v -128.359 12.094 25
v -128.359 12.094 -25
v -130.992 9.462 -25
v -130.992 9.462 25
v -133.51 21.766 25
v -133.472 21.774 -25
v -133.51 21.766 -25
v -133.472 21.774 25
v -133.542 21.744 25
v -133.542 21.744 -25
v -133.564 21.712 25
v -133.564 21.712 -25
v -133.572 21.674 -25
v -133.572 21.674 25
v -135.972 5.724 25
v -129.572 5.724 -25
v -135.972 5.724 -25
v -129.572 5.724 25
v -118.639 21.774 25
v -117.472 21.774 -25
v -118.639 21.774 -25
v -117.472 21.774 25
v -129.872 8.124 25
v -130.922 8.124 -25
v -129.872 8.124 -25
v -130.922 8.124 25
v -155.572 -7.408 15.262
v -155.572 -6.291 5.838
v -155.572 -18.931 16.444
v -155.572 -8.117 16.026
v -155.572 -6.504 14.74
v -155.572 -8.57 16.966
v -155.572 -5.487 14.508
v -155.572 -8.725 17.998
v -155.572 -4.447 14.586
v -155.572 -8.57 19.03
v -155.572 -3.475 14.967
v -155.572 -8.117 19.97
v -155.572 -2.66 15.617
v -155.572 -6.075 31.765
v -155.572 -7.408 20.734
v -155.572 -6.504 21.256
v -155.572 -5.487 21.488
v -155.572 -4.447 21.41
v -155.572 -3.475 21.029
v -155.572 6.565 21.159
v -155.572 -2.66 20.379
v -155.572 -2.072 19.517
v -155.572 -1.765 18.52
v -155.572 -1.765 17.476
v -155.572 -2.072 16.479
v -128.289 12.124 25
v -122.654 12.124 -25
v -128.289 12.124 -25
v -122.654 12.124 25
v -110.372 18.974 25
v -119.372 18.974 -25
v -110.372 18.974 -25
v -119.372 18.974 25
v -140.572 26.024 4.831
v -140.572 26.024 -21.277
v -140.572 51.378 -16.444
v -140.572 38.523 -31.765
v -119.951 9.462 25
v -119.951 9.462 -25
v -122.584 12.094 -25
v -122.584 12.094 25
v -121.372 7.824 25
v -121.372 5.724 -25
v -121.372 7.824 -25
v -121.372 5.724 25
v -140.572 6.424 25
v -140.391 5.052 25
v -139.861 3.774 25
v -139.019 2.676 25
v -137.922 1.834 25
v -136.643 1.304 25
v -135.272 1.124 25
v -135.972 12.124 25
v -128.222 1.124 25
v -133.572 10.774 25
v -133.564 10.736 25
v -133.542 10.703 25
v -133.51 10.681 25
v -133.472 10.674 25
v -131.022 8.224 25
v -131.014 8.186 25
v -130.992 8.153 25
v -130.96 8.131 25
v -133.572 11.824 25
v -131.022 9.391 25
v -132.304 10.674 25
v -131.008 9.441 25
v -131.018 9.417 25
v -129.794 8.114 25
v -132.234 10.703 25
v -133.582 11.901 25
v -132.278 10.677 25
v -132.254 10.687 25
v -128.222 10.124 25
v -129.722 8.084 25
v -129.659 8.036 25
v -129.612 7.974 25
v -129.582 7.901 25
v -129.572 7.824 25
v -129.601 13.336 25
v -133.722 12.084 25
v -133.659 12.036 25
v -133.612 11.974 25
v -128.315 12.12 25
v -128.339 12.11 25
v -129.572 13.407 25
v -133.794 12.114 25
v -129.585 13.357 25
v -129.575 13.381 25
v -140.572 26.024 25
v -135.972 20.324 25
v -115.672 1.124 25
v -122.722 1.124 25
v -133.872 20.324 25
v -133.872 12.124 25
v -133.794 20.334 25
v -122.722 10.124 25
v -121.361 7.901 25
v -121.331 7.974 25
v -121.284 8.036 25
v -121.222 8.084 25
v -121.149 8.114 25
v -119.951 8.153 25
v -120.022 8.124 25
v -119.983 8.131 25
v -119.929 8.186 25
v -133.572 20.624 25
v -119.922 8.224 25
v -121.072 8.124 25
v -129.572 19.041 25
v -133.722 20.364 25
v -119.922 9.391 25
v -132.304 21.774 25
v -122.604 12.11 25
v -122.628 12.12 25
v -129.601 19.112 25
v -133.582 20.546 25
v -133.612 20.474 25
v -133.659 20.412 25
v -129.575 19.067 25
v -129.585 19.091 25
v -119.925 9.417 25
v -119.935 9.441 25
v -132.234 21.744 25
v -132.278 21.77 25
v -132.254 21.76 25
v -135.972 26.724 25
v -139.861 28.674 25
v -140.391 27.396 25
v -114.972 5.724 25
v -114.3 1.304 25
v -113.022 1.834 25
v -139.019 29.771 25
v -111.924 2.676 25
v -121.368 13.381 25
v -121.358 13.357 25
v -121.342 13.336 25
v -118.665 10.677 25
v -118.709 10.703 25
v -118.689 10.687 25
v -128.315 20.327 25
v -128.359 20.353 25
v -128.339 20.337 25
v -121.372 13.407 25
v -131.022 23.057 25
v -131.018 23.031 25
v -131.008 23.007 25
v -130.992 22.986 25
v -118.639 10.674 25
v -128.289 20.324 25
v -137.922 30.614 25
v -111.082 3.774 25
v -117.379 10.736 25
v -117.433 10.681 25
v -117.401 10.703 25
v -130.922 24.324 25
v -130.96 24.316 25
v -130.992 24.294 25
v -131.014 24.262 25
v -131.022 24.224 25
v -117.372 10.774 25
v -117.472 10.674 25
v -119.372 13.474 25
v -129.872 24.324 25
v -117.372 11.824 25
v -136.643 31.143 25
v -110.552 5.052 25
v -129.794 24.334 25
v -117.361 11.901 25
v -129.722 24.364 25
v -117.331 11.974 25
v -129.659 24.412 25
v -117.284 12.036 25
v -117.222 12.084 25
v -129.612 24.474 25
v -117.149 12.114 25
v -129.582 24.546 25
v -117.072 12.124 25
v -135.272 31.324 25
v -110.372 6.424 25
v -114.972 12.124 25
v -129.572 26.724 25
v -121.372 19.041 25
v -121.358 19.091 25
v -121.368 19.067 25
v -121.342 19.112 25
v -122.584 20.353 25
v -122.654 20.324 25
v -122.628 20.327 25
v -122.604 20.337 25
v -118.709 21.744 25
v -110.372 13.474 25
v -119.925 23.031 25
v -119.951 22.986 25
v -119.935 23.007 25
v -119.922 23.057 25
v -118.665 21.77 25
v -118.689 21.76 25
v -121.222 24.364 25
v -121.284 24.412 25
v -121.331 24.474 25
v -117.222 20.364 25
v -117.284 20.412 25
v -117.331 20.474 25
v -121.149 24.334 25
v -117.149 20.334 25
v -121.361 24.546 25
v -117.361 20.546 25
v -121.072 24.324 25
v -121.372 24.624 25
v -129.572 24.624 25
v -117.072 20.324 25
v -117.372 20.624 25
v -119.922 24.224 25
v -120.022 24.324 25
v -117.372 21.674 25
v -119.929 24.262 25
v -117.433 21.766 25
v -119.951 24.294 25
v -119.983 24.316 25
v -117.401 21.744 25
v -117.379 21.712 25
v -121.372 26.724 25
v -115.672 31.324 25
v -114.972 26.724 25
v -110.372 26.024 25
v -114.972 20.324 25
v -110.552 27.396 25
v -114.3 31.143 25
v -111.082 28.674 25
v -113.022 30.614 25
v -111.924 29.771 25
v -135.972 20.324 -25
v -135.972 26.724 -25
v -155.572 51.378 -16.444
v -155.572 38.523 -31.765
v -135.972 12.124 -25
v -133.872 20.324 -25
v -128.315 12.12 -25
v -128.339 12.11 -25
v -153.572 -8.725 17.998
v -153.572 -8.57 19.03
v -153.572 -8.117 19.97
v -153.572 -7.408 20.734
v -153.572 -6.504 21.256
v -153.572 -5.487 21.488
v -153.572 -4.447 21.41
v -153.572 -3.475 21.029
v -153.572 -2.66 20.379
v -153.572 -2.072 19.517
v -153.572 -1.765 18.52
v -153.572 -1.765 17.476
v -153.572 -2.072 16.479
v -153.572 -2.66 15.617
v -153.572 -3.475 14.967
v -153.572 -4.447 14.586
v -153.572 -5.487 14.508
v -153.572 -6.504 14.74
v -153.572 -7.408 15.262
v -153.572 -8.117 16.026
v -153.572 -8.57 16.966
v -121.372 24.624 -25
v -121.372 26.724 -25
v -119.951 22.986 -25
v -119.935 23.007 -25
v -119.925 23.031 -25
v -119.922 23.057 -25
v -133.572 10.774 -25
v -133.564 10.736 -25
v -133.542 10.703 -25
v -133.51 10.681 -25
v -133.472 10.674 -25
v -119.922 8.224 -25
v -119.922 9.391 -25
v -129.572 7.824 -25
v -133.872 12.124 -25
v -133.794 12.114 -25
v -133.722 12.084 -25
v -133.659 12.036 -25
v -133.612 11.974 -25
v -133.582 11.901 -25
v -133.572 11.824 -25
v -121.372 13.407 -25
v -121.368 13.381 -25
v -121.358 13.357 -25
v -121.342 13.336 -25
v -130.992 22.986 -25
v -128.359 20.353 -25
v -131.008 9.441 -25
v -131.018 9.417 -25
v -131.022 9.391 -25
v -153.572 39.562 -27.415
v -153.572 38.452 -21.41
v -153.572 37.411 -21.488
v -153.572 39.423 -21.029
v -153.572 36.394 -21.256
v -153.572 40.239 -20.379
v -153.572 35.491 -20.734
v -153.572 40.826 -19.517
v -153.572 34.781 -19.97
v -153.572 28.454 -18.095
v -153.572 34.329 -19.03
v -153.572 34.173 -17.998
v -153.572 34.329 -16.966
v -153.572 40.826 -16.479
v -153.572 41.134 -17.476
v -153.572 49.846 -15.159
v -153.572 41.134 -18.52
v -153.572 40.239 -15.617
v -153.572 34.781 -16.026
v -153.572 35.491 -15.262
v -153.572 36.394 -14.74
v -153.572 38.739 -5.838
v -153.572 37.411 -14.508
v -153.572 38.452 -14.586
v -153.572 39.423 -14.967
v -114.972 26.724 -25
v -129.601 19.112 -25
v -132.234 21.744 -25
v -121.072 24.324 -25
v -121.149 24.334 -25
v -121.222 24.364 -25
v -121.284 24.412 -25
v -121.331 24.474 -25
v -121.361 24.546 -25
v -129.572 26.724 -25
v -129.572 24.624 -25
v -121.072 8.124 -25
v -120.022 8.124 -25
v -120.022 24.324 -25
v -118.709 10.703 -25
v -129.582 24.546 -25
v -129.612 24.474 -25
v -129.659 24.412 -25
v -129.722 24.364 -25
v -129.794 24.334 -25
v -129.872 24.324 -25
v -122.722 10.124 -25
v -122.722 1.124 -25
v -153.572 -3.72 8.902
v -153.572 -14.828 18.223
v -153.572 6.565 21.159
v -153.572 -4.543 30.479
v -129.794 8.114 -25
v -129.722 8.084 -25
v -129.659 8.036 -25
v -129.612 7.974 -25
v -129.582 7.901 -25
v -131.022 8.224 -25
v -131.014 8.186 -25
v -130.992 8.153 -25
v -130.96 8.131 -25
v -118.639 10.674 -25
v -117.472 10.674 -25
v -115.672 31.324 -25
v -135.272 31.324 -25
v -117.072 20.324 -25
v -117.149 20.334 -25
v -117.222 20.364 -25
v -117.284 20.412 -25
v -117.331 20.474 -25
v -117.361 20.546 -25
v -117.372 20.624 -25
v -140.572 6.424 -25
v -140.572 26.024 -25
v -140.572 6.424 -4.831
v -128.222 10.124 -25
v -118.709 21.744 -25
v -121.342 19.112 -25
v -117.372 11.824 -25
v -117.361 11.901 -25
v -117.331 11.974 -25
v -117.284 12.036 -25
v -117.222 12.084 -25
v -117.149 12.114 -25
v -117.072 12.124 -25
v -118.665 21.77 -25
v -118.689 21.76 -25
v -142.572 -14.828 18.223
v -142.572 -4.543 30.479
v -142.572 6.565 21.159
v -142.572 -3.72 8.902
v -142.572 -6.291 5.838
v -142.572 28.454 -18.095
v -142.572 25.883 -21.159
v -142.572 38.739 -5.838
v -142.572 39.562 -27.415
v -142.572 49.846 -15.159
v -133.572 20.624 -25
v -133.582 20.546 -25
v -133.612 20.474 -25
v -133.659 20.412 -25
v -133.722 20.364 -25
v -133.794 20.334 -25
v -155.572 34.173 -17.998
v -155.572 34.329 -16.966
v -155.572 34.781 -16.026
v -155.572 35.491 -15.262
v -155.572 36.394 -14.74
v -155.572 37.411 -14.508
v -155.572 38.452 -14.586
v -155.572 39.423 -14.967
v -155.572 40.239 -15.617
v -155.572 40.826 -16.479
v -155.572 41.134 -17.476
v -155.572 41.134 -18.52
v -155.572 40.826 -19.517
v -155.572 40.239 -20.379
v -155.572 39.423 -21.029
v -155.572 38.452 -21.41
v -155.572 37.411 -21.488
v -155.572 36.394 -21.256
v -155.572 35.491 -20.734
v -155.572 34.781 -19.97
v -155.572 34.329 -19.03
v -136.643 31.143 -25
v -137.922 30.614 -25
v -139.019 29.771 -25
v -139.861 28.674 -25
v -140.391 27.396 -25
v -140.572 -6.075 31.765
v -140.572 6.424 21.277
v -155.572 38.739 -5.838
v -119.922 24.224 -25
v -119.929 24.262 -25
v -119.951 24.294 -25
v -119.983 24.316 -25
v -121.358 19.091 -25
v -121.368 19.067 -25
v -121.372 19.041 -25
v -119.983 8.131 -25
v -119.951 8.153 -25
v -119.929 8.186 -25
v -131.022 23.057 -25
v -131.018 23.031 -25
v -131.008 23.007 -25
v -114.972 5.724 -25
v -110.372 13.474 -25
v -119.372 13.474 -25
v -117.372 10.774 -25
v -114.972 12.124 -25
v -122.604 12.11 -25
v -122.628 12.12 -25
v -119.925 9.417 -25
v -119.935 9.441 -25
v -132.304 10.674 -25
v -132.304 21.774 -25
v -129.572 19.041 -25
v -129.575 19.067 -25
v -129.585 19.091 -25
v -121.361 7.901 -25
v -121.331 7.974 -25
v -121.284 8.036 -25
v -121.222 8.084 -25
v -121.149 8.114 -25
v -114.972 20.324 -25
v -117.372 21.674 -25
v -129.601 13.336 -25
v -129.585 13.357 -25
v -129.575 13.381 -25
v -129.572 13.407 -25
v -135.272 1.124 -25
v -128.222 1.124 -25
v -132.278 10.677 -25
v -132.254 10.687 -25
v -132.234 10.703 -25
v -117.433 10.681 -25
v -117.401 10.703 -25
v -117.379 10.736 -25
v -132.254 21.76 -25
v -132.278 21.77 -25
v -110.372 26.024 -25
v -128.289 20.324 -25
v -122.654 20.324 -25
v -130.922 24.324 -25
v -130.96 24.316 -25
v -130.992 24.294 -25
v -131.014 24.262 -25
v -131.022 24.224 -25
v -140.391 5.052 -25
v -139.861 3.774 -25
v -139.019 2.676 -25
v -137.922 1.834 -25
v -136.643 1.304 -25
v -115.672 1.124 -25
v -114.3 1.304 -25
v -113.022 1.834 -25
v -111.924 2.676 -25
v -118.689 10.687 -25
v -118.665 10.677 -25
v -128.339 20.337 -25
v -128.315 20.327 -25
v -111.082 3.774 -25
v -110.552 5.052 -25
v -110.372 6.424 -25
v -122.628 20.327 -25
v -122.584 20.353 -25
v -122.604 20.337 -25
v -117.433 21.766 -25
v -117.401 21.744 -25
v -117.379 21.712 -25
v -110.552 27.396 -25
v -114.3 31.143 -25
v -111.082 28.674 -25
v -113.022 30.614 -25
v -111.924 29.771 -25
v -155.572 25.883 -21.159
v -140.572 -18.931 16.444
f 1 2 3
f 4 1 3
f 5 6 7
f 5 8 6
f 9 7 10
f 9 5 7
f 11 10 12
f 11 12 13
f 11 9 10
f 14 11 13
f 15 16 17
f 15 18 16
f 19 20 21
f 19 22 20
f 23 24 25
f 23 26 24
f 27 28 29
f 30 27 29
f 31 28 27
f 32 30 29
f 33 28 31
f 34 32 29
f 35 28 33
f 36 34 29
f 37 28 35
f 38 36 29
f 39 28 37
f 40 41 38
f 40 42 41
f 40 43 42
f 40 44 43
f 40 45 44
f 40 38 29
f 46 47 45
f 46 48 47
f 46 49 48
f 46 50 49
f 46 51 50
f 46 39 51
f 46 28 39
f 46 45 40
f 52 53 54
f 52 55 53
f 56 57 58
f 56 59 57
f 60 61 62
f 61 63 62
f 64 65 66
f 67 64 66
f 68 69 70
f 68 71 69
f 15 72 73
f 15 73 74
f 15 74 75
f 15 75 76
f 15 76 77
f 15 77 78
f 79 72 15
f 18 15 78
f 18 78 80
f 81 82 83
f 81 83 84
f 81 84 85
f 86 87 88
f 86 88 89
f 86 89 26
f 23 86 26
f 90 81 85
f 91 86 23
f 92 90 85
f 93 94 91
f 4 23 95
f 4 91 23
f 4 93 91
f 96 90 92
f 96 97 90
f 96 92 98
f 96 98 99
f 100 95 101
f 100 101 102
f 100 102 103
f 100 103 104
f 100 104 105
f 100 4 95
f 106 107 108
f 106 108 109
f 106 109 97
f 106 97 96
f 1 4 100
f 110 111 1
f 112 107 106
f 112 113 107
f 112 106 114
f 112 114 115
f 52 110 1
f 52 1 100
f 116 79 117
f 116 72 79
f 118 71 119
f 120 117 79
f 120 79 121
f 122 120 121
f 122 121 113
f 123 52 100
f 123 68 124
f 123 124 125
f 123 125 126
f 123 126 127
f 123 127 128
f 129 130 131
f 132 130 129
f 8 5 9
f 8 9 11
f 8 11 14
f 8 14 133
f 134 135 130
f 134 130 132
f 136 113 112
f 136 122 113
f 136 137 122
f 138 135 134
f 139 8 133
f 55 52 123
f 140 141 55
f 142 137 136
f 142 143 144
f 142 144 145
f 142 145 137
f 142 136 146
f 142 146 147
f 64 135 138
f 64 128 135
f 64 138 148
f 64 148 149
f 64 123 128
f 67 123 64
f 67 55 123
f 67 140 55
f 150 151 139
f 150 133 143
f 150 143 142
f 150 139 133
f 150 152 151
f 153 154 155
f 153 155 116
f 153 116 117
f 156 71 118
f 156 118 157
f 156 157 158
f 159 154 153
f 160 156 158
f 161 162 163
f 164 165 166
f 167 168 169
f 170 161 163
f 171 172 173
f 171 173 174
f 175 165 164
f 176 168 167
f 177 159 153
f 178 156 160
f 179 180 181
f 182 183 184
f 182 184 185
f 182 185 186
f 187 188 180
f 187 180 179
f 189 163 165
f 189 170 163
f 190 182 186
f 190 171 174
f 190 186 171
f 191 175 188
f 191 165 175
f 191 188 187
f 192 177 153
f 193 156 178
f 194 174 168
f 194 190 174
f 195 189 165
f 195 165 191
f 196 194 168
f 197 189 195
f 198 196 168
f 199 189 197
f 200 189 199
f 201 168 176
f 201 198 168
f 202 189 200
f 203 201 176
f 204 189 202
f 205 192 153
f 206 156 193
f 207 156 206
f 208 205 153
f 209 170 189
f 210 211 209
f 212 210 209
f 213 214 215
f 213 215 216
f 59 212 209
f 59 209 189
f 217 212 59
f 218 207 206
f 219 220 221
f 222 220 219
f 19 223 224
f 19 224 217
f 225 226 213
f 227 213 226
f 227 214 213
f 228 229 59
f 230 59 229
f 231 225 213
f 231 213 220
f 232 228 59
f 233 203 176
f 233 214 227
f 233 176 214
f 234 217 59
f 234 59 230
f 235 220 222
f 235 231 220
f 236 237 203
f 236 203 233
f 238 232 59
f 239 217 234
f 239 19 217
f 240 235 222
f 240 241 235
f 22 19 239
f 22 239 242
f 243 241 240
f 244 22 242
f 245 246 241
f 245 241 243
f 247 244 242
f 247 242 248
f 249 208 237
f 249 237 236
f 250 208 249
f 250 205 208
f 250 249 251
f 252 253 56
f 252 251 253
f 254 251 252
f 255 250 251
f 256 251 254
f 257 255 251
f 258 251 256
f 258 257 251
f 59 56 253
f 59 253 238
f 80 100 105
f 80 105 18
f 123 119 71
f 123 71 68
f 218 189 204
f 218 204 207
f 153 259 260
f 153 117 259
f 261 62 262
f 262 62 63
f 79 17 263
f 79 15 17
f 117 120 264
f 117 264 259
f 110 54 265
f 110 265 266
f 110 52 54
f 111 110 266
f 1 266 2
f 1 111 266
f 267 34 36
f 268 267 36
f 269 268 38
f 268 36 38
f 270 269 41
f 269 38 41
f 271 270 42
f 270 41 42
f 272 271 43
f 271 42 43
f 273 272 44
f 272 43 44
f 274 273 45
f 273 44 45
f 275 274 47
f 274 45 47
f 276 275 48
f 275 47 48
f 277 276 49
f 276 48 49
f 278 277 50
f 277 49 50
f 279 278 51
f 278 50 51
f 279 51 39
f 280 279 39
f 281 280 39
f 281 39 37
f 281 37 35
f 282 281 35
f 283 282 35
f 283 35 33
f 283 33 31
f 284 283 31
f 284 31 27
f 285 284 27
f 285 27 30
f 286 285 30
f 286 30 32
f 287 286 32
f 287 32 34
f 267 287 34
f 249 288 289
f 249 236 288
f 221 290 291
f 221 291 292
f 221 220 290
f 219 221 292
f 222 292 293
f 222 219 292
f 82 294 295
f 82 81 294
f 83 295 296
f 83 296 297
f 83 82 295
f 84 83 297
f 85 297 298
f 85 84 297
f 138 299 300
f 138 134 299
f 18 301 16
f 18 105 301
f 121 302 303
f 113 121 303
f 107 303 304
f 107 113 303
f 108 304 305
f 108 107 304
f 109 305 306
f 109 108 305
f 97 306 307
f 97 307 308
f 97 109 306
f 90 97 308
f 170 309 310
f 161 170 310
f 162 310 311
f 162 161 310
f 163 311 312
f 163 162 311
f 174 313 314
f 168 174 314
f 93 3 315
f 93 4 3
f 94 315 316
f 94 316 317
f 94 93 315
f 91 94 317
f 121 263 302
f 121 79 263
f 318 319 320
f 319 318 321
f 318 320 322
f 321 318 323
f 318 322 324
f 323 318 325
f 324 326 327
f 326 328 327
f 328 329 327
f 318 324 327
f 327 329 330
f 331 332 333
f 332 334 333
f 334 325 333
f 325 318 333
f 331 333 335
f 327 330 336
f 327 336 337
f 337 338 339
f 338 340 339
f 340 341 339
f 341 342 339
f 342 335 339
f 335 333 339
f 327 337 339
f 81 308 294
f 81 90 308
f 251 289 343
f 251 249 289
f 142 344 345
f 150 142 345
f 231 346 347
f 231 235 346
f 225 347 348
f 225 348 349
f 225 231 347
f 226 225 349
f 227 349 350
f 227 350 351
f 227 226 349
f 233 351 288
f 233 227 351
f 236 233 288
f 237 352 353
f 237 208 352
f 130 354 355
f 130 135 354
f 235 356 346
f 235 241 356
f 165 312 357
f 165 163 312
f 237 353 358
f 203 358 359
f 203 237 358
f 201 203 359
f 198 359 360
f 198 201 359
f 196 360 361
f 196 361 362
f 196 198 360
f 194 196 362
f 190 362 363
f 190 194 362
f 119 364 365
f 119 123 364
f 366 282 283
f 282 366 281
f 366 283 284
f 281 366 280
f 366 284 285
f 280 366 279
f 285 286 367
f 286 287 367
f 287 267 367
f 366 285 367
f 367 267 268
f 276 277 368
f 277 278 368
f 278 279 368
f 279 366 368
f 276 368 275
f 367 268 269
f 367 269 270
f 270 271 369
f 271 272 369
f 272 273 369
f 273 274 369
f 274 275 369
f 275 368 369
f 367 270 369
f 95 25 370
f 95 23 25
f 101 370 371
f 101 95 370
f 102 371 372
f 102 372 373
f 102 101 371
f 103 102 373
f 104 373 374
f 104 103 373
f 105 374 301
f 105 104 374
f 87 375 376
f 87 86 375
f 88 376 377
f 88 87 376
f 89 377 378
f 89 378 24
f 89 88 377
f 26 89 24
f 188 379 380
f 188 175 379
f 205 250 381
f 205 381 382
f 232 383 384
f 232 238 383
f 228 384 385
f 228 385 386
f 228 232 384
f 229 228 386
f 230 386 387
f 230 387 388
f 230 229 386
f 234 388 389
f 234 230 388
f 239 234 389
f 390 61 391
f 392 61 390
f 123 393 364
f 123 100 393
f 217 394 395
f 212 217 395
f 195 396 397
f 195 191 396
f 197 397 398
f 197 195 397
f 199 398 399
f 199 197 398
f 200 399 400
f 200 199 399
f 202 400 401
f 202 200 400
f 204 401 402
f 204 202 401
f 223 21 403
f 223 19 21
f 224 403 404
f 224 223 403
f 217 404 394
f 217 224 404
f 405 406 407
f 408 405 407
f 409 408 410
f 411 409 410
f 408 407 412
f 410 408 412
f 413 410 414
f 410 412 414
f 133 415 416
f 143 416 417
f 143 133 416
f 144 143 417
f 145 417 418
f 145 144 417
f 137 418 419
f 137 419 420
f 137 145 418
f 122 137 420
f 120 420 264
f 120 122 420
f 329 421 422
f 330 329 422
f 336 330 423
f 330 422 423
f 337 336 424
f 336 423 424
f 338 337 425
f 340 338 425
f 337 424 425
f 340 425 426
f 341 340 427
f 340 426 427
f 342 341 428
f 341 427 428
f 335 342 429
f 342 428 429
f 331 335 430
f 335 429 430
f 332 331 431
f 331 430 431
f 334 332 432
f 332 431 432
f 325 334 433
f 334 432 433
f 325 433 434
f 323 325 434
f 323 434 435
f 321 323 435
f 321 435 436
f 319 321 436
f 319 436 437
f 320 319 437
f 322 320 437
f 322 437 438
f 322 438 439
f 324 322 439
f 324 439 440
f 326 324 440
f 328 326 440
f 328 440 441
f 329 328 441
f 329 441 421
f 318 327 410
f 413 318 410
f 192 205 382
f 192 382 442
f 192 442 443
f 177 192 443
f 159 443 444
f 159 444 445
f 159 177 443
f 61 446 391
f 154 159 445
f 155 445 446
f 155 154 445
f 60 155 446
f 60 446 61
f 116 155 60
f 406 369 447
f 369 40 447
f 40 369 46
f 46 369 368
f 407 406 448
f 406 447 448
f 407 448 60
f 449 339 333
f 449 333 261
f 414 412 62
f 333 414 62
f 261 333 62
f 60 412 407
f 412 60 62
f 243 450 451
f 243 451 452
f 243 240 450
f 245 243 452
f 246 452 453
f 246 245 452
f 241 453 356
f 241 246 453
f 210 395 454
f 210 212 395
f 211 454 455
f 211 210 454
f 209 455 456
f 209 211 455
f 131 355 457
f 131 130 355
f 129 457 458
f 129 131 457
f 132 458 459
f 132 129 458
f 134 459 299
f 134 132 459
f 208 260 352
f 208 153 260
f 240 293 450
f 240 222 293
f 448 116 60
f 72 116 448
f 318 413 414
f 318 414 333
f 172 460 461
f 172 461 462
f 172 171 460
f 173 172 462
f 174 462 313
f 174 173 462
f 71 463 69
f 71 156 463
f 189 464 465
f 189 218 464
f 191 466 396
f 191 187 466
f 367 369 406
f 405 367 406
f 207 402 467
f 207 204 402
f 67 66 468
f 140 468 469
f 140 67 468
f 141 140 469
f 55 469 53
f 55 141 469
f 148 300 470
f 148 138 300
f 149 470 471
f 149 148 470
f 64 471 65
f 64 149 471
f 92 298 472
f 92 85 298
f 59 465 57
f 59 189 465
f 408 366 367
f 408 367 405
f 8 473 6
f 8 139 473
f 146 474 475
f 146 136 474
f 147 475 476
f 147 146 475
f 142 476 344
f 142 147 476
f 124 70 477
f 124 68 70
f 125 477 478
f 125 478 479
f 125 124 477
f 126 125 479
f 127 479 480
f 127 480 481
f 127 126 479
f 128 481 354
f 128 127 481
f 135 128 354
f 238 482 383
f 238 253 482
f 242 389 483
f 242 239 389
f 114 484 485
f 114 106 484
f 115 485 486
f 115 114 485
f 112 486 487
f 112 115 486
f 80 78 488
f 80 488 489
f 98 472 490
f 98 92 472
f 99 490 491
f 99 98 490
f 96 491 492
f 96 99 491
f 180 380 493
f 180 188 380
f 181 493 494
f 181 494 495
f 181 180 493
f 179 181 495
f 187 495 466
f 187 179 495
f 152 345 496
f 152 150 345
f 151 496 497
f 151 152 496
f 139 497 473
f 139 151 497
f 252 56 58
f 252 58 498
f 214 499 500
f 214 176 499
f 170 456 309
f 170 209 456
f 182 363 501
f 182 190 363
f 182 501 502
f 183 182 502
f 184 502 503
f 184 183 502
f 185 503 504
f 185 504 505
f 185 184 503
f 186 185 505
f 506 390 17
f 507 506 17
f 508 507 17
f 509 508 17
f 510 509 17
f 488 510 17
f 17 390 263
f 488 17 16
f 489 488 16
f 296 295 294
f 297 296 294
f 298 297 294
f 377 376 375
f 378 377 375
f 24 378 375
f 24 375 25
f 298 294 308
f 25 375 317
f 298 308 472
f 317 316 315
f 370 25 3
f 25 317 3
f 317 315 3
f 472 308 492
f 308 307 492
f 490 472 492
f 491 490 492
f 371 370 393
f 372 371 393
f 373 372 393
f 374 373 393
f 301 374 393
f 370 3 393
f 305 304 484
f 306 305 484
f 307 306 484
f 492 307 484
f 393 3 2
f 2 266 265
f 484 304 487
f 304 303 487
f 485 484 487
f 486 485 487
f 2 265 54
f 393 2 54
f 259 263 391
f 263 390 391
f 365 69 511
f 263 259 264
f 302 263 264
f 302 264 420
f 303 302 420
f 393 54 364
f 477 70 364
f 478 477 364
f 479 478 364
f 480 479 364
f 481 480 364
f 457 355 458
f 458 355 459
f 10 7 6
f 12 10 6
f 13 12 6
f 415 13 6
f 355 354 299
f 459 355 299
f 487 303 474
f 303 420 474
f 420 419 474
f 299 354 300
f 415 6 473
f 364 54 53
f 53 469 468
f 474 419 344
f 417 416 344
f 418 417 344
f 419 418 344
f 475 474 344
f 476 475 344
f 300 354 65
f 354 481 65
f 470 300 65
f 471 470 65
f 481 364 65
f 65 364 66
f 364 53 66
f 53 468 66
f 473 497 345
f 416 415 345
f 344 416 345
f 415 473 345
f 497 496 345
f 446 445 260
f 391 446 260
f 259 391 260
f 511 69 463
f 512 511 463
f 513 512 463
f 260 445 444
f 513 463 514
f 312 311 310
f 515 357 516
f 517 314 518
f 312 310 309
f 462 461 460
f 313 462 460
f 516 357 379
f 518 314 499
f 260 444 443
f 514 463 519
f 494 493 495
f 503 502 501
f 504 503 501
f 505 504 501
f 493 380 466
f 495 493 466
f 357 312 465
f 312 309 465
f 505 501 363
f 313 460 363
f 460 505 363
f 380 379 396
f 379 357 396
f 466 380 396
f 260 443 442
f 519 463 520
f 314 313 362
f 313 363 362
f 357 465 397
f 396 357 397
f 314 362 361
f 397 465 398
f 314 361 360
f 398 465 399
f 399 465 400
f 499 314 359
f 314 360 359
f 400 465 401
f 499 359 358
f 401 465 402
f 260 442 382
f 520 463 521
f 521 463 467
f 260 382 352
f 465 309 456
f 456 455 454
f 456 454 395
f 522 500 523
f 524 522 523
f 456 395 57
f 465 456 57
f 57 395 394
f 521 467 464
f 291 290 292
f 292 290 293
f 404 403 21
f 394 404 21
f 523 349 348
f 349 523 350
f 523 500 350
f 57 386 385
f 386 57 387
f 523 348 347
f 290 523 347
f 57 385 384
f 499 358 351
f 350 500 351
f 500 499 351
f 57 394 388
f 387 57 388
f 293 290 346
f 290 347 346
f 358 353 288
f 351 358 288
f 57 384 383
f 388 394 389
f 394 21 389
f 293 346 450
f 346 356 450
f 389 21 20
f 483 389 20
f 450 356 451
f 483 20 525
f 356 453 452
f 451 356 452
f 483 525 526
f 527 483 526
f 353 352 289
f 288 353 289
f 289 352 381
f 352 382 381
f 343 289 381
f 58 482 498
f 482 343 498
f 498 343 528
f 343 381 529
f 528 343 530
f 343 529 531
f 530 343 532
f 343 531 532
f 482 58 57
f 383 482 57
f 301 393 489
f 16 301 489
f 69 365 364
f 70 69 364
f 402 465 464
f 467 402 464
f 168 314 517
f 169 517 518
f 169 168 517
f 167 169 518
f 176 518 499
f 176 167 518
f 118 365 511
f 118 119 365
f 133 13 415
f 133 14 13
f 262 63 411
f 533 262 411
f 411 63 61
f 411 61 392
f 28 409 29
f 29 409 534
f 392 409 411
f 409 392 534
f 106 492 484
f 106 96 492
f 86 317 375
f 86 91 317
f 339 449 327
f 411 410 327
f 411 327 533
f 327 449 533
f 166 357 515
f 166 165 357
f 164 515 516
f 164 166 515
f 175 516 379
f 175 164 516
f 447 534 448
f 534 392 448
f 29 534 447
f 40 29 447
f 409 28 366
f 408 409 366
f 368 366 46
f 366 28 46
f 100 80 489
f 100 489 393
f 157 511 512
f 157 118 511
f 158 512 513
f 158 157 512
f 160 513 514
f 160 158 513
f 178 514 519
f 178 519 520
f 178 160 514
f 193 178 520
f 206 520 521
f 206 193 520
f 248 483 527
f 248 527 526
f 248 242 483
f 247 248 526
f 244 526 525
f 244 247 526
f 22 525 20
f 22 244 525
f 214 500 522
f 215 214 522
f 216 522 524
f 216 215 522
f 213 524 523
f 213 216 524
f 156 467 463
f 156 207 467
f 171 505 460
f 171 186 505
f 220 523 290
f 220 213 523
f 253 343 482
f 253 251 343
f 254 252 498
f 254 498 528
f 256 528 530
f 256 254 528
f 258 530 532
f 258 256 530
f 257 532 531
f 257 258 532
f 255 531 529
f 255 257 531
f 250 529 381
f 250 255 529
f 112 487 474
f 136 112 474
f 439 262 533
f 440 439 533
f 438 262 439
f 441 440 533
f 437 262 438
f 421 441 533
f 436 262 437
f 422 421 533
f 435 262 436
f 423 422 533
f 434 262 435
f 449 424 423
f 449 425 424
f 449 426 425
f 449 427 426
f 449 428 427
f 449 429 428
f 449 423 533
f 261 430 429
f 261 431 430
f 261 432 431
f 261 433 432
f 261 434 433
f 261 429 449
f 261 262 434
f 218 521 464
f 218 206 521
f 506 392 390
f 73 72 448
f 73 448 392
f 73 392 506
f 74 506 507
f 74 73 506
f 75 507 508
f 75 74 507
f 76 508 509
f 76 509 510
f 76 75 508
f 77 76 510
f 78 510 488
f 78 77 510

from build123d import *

# Parameters (mm, degrees)
Y_KSEKLIK_EKSTR_ZYON3_DEPTH = 25
Y_KSEKLIK_EKSTR_ZYON4_DEPTH = 15
IZIM11_R                    = 3.5
KES_EKSTR_ZYON3_DEPTH       = 10
KES_EKSTR_ZYON4_DEPTH       = 16
KES_EKSTR_ZYON5_REACH       = 77.444


with BuildPart() as part:
    # Çizim6 → Yükseklik-Ekstrüzyon3 (new, symmetric)
    with BuildSketch(Plane.XY):
        with BuildLine():
            Line((-119.371512251, 18.973770729), (-115.371512251, 18.973770729))
            Line((-115.371512251, 18.973770729), (-110.371512251, 18.973770729))
            Line((-110.371512251, 18.973770729), (-110.371512251, 20.773770729))
            Line((-110.371512251, 20.773770729), (-110.371512251, 26.023770729))
            ThreePointArc((-110.371512251, 26.023770729), (-111.92384631, 29.771436669), (-115.671512251, 31.323770729))
            Line((-115.671512251, 31.323770729), (-120.921512251, 31.323770729))
            Line((-120.921512251, 31.323770729), (-122.721512251, 31.323770729))
            Line((-122.721512251, 31.323770729), (-128.221512251, 31.323770729))
            Line((-128.221512251, 31.323770729), (-130.021512251, 31.323770729))
            Line((-130.021512251, 31.323770729), (-135.271512251, 31.323770729))
            ThreePointArc((-135.271512251, 31.323770729), (-139.019178191, 29.771436669), (-140.571512251, 26.023770729))
            Line((-140.571512251, 26.023770729), (-140.571512251, 20.773770729))
            Line((-140.571512251, 20.773770729), (-140.571512251, 16.223770729))
            Line((-140.571512251, 16.223770729), (-140.571512251, 11.673770729))
            Line((-140.571512251, 11.673770729), (-140.571512251, 6.423770729))
            ThreePointArc((-140.571512251, 6.423770729), (-139.019178191, 2.676104789), (-135.271512251, 1.123770729))
            Line((-135.271512251, 1.123770729), (-130.021512251, 1.123770729))
            Line((-130.021512251, 1.123770729), (-128.221512251, 1.123770729))
            Line((-128.221512251, 1.123770729), (-128.221512251, 6.123770729))
            Line((-128.221512251, 6.123770729), (-128.221512251, 10.123770729))
            Line((-128.221512251, 10.123770729), (-122.721512251, 10.123770729))
            Line((-122.721512251, 10.123770729), (-122.721512251, 6.123770729))
            Line((-122.721512251, 6.123770729), (-122.721512251, 1.123770729))
            Line((-122.721512251, 1.123770729), (-120.921512251, 1.123770729))
            Line((-120.921512251, 1.123770729), (-115.671512251, 1.123770729))
            ThreePointArc((-115.671512251, 1.123770729), (-111.92384631, 2.676104789), (-110.371512251, 6.423770729))
            Line((-110.371512251, 6.423770729), (-110.371512251, 11.673770729))
            Line((-110.371512251, 11.673770729), (-110.371512251, 13.473770729))
            Line((-110.371512251, 13.473770729), (-115.371512251, 13.473770729))
            Line((-115.371512251, 13.473770729), (-119.371512251, 13.473770729))
            Line((-119.371512251, 13.473770729), (-119.371512251, 18.973770729))
        make_face()
        with BuildLine():
            Line((-133.871512251, 20.323770729), (-135.071512251, 20.323770729))
            Line((-135.071512251, 20.323770729), (-135.871512251, 20.323770729))
            Line((-135.871512251, 20.323770729), (-135.971512251, 20.323770729))
            Line((-135.971512251, 20.323770729), (-135.971512251, 26.723770729))
            Line((-135.971512251, 26.723770729), (-129.571512251, 26.723770729))
            Line((-129.571512251, 26.723770729), (-129.571512251, 26.623770729))
            Line((-129.571512251, 26.623770729), (-129.571512251, 25.823770729))
            Line((-129.571512251, 25.823770729), (-129.571512251, 24.623770729))
            ThreePointArc((-129.571512251, 24.623770729), (-129.659380216, 24.411638694), (-129.871512251, 24.323770729))
            Line((-129.871512251, 24.323770729), (-130.921512251, 24.323770729))
            ThreePointArc((-130.921512251, 24.323770729), (-130.992222929, 24.294481407), (-131.021512251, 24.223770729))
            Line((-131.021512251, 24.223770729), (-131.021512251, 23.056613441))
            ThreePointArc((-131.021512251, 23.056613441), (-131.013900204, 23.018345098), (-130.992222929, 22.985902763))
            Line((-130.992222929, 22.985902763), (-128.359380216, 20.353060051))
            ThreePointArc((-128.359380216, 20.353060051), (-128.326937882, 20.331382776), (-128.288669538, 20.323770729))
            Line((-128.288669538, 20.323770729), (-122.654354963, 20.323770729))
            ThreePointArc((-122.654354963, 20.323770729), (-122.61608662, 20.331382776), (-122.583644285, 20.353060051))
            Line((-122.583644285, 20.353060051), (-119.950801573, 22.985902763))
            ThreePointArc((-119.950801573, 22.985902763), (-119.929124298, 23.018345098), (-119.921512251, 23.056613441))
            Line((-119.921512251, 23.056613441), (-119.921512251, 24.223770729))
            ThreePointArc((-119.921512251, 24.223770729), (-119.950801573, 24.294481407), (-120.021512251, 24.323770729))
            Line((-120.021512251, 24.323770729), (-121.071512251, 24.323770729))
            ThreePointArc((-121.071512251, 24.323770729), (-121.283644285, 24.411638694), (-121.371512251, 24.623770729))
            Line((-121.371512251, 24.623770729), (-121.371512251, 25.823770729))
            Line((-121.371512251, 25.823770729), (-121.371512251, 26.323770729))
            Line((-121.371512251, 26.323770729), (-121.371512251, 26.723770729))
            Line((-121.371512251, 26.723770729), (-114.971512251, 26.723770729))
            Line((-114.971512251, 26.723770729), (-114.971512251, 20.323770729))
            Line((-114.971512251, 20.323770729), (-115.371512251, 20.323770729))
            Line((-115.371512251, 20.323770729), (-115.871512251, 20.323770729))
            Line((-115.871512251, 20.323770729), (-117.071512251, 20.323770729))
            ThreePointArc((-117.071512251, 20.323770729), (-117.283644285, 20.411638694), (-117.371512251, 20.623770729))
            Line((-117.371512251, 20.623770729), (-117.371512251, 21.673770729))
            ThreePointArc((-117.371512251, 21.673770729), (-117.400801573, 21.744481407), (-117.471512251, 21.773770729))
            Line((-117.471512251, 21.773770729), (-118.638669538, 21.773770729))
            ThreePointArc((-118.638669538, 21.773770729), (-118.676937882, 21.766158682), (-118.709380216, 21.744481407))
            Line((-118.709380216, 21.744481407), (-121.342222929, 19.111638694))
            ThreePointArc((-121.342222929, 19.111638694), (-121.363900204, 19.07919636), (-121.371512251, 19.040928016))
            Line((-121.371512251, 19.040928016), (-121.371512251, 13.406613441))
            ThreePointArc((-121.371512251, 13.406613441), (-121.363900204, 13.368345098), (-121.342222929, 13.335902763))
            Line((-121.342222929, 13.335902763), (-118.709380216, 10.703060051))
            ThreePointArc((-118.709380216, 10.703060051), (-118.676937882, 10.681382776), (-118.638669538, 10.673770729))
            Line((-118.638669538, 10.673770729), (-117.471512251, 10.673770729))
            ThreePointArc((-117.471512251, 10.673770729), (-117.400801573, 10.703060051), (-117.371512251, 10.773770729))
            Line((-117.371512251, 10.773770729), (-117.371512251, 11.823770729))
            ThreePointArc((-117.371512251, 11.823770729), (-117.283644285, 12.035902763), (-117.071512251, 12.123770729))
            Line((-117.071512251, 12.123770729), (-115.871512251, 12.123770729))
            Line((-115.871512251, 12.123770729), (-115.371512251, 12.123770729))
            Line((-115.371512251, 12.123770729), (-114.971512251, 12.123770729))
            Line((-114.971512251, 12.123770729), (-114.971512251, 5.723770729))
            Line((-114.971512251, 5.723770729), (-121.371512251, 5.723770729))
            Line((-121.371512251, 5.723770729), (-121.371512251, 6.123770729))
            Line((-121.371512251, 6.123770729), (-121.371512251, 6.623770729))
            Line((-121.371512251, 6.623770729), (-121.371512251, 7.823770729))
            ThreePointArc((-121.371512251, 7.823770729), (-121.283644285, 8.035902763), (-121.071512251, 8.123770729))
            Line((-121.071512251, 8.123770729), (-120.021512251, 8.123770729))
            ThreePointArc((-120.021512251, 8.123770729), (-119.950801573, 8.153060051), (-119.921512251, 8.223770729))
            Line((-119.921512251, 8.223770729), (-119.921512251, 9.390928016))
            ThreePointArc((-119.921512251, 9.390928016), (-119.929124298, 9.42919636), (-119.950801573, 9.461638694))
            Line((-119.950801573, 9.461638694), (-122.583644285, 12.094481407))
            ThreePointArc((-122.583644285, 12.094481407), (-122.61608662, 12.116158682), (-122.654354963, 12.123770729))
            Line((-122.654354963, 12.123770729), (-128.288669538, 12.123770729))
            ThreePointArc((-128.288669538, 12.123770729), (-128.326937882, 12.116158682), (-128.359380216, 12.094481407))
            Line((-128.359380216, 12.094481407), (-130.992222929, 9.461638694))
            ThreePointArc((-130.992222929, 9.461638694), (-131.013900204, 9.42919636), (-131.021512251, 9.390928016))
            Line((-131.021512251, 9.390928016), (-131.021512251, 8.223770729))
            ThreePointArc((-131.021512251, 8.223770729), (-130.992222929, 8.153060051), (-130.921512251, 8.123770729))
            Line((-130.921512251, 8.123770729), (-129.871512251, 8.123770729))
            ThreePointArc((-129.871512251, 8.123770729), (-129.659380216, 8.035902763), (-129.571512251, 7.823770729))
            Line((-129.571512251, 7.823770729), (-129.571512251, 6.623770729))
            Line((-129.571512251, 6.623770729), (-129.571512251, 6.123770729))
            Line((-129.571512251, 6.123770729), (-129.571512251, 5.723770729))
            Line((-129.571512251, 5.723770729), (-135.971512251, 5.723770729))
            Line((-135.971512251, 5.723770729), (-135.971512251, 12.123770729))
            Line((-135.971512251, 12.123770729), (-135.571512251, 12.123770729))
            Line((-135.571512251, 12.123770729), (-135.071512251, 12.123770729))
            Line((-135.071512251, 12.123770729), (-133.871512251, 12.123770729))
            ThreePointArc((-133.871512251, 12.123770729), (-133.659380216, 12.035902763), (-133.571512251, 11.823770729))
            Line((-133.571512251, 11.823770729), (-133.571512251, 10.773770729))
            ThreePointArc((-133.571512251, 10.773770729), (-133.542222929, 10.703060051), (-133.471512251, 10.673770729))
            Line((-133.471512251, 10.673770729), (-132.304354963, 10.673770729))
            ThreePointArc((-132.304354963, 10.673770729), (-132.26608662, 10.681382776), (-132.233644285, 10.703060051))
            Line((-132.233644285, 10.703060051), (-129.600801573, 13.335902763))
            ThreePointArc((-129.600801573, 13.335902763), (-129.579124298, 13.368345098), (-129.571512251, 13.406613441))
            Line((-129.571512251, 13.406613441), (-129.571512251, 19.040928016))
            ThreePointArc((-129.571512251, 19.040928016), (-129.579124298, 19.07919636), (-129.600801573, 19.111638694))
            Line((-129.600801573, 19.111638694), (-132.233644285, 21.744481407))
            ThreePointArc((-132.233644285, 21.744481407), (-132.26608662, 21.766158682), (-132.304354963, 21.773770729))
            Line((-132.304354963, 21.773770729), (-133.471512251, 21.773770729))
            ThreePointArc((-133.471512251, 21.773770729), (-133.542222929, 21.744481407), (-133.571512251, 21.673770729))
            Line((-133.571512251, 21.673770729), (-133.571512251, 20.623770729))
            ThreePointArc((-133.571512251, 20.623770729), (-133.659380216, 20.411638694), (-133.871512251, 20.323770729))
        make_face(mode=Mode.SUBTRACT)
    extrude(amount=Y_KSEKLIK_EKSTR_ZYON3_DEPTH, both=True)

    # Çizim8 → Yükseklik-Ekstrüzyon4 (add)
    with BuildSketch(Plane.ZY.offset(140.571512251)):
        Polygon((31.764979794, -6.075019791), (-16.444090932, 51.378313443), (-31.764979794, 38.522561249), (16.444090932, -18.930771985), align=None)
    extrude(amount=Y_KSEKLIK_EKSTR_ZYON4_DEPTH)

    # Çizim11 → Kes-Ekstrüzyon3 (cut)
    with BuildSketch(Plane.ZY.offset(155.571512251)):
        with Locations(Location((17.998053071, -5.225473678, 0), (0, 0, 270))):
            Circle(IZIM11_R)
        with Locations(Location((-17.998053071, 37.673015136, 0), (0, 0, 270))):
            Circle(IZIM11_R)
    extrude(amount=-KES_EKSTR_ZYON3_DEPTH, mode=Mode.SUBTRACT)

    # Çizim12 → Kes-Ekstrüzyon4 (cut)
    with BuildSketch(Plane(origin=(0, 13.13114735, 15.64909203), x_dir=(1, 0, 0), z_dir=(-3.3982743057988955e-15, 0.6427876096865416, 0.7660444431189761))):
        Polygon((-142.571512251, 47.928129413), (-153.571512251, 47.928129413), (-153.571512251, 36.149140278), (-153.571512251, -23.071870587), (-142.571512251, -23.071870587), (-142.571512251, -8.755858334), (-142.571512251, 16.830124537), align=None)
    extrude(amount=-KES_EKSTR_ZYON4_DEPTH, mode=Mode.SUBTRACT)

    # Kes-Ekstrüzyon5: up to this face of the body (flat: up to its plane)
    kes_ekstr_zyon5_end = Plane(part.part.faces().sort_by_distance((-142.571512251, 17.509345948, 1.532088886))[0])
    # Çizim13 → Kes-Ekstrüzyon5 (cut, up to the picked face)
    with BuildSketch(Plane.ZY.offset(155.571512251), mode=Mode.PRIVATE) as kes_ekstr_zyon5_sk1:
        Polygon((-5.838095372, 38.738580131), (-21.158984235, 25.882827937), (5.838095372, -6.291038674), (21.158984235, 6.56471352), align=None)
    kes_ekstr_zyon5_tool1 = split(extrude(kes_ekstr_zyon5_sk1.sketch, amount=-KES_EKSTR_ZYON5_REACH, mode=Mode.PRIVATE), bisect_by=kes_ekstr_zyon5_end, keep=Keep.BOTH, mode=Mode.PRIVATE)
    add(kes_ekstr_zyon5_tool1.solids().sort_by(Axis((-155.571512, 16.223771, 0), (1, 0, 0)))[0], mode=Mode.SUBTRACT)


solid = part.part
